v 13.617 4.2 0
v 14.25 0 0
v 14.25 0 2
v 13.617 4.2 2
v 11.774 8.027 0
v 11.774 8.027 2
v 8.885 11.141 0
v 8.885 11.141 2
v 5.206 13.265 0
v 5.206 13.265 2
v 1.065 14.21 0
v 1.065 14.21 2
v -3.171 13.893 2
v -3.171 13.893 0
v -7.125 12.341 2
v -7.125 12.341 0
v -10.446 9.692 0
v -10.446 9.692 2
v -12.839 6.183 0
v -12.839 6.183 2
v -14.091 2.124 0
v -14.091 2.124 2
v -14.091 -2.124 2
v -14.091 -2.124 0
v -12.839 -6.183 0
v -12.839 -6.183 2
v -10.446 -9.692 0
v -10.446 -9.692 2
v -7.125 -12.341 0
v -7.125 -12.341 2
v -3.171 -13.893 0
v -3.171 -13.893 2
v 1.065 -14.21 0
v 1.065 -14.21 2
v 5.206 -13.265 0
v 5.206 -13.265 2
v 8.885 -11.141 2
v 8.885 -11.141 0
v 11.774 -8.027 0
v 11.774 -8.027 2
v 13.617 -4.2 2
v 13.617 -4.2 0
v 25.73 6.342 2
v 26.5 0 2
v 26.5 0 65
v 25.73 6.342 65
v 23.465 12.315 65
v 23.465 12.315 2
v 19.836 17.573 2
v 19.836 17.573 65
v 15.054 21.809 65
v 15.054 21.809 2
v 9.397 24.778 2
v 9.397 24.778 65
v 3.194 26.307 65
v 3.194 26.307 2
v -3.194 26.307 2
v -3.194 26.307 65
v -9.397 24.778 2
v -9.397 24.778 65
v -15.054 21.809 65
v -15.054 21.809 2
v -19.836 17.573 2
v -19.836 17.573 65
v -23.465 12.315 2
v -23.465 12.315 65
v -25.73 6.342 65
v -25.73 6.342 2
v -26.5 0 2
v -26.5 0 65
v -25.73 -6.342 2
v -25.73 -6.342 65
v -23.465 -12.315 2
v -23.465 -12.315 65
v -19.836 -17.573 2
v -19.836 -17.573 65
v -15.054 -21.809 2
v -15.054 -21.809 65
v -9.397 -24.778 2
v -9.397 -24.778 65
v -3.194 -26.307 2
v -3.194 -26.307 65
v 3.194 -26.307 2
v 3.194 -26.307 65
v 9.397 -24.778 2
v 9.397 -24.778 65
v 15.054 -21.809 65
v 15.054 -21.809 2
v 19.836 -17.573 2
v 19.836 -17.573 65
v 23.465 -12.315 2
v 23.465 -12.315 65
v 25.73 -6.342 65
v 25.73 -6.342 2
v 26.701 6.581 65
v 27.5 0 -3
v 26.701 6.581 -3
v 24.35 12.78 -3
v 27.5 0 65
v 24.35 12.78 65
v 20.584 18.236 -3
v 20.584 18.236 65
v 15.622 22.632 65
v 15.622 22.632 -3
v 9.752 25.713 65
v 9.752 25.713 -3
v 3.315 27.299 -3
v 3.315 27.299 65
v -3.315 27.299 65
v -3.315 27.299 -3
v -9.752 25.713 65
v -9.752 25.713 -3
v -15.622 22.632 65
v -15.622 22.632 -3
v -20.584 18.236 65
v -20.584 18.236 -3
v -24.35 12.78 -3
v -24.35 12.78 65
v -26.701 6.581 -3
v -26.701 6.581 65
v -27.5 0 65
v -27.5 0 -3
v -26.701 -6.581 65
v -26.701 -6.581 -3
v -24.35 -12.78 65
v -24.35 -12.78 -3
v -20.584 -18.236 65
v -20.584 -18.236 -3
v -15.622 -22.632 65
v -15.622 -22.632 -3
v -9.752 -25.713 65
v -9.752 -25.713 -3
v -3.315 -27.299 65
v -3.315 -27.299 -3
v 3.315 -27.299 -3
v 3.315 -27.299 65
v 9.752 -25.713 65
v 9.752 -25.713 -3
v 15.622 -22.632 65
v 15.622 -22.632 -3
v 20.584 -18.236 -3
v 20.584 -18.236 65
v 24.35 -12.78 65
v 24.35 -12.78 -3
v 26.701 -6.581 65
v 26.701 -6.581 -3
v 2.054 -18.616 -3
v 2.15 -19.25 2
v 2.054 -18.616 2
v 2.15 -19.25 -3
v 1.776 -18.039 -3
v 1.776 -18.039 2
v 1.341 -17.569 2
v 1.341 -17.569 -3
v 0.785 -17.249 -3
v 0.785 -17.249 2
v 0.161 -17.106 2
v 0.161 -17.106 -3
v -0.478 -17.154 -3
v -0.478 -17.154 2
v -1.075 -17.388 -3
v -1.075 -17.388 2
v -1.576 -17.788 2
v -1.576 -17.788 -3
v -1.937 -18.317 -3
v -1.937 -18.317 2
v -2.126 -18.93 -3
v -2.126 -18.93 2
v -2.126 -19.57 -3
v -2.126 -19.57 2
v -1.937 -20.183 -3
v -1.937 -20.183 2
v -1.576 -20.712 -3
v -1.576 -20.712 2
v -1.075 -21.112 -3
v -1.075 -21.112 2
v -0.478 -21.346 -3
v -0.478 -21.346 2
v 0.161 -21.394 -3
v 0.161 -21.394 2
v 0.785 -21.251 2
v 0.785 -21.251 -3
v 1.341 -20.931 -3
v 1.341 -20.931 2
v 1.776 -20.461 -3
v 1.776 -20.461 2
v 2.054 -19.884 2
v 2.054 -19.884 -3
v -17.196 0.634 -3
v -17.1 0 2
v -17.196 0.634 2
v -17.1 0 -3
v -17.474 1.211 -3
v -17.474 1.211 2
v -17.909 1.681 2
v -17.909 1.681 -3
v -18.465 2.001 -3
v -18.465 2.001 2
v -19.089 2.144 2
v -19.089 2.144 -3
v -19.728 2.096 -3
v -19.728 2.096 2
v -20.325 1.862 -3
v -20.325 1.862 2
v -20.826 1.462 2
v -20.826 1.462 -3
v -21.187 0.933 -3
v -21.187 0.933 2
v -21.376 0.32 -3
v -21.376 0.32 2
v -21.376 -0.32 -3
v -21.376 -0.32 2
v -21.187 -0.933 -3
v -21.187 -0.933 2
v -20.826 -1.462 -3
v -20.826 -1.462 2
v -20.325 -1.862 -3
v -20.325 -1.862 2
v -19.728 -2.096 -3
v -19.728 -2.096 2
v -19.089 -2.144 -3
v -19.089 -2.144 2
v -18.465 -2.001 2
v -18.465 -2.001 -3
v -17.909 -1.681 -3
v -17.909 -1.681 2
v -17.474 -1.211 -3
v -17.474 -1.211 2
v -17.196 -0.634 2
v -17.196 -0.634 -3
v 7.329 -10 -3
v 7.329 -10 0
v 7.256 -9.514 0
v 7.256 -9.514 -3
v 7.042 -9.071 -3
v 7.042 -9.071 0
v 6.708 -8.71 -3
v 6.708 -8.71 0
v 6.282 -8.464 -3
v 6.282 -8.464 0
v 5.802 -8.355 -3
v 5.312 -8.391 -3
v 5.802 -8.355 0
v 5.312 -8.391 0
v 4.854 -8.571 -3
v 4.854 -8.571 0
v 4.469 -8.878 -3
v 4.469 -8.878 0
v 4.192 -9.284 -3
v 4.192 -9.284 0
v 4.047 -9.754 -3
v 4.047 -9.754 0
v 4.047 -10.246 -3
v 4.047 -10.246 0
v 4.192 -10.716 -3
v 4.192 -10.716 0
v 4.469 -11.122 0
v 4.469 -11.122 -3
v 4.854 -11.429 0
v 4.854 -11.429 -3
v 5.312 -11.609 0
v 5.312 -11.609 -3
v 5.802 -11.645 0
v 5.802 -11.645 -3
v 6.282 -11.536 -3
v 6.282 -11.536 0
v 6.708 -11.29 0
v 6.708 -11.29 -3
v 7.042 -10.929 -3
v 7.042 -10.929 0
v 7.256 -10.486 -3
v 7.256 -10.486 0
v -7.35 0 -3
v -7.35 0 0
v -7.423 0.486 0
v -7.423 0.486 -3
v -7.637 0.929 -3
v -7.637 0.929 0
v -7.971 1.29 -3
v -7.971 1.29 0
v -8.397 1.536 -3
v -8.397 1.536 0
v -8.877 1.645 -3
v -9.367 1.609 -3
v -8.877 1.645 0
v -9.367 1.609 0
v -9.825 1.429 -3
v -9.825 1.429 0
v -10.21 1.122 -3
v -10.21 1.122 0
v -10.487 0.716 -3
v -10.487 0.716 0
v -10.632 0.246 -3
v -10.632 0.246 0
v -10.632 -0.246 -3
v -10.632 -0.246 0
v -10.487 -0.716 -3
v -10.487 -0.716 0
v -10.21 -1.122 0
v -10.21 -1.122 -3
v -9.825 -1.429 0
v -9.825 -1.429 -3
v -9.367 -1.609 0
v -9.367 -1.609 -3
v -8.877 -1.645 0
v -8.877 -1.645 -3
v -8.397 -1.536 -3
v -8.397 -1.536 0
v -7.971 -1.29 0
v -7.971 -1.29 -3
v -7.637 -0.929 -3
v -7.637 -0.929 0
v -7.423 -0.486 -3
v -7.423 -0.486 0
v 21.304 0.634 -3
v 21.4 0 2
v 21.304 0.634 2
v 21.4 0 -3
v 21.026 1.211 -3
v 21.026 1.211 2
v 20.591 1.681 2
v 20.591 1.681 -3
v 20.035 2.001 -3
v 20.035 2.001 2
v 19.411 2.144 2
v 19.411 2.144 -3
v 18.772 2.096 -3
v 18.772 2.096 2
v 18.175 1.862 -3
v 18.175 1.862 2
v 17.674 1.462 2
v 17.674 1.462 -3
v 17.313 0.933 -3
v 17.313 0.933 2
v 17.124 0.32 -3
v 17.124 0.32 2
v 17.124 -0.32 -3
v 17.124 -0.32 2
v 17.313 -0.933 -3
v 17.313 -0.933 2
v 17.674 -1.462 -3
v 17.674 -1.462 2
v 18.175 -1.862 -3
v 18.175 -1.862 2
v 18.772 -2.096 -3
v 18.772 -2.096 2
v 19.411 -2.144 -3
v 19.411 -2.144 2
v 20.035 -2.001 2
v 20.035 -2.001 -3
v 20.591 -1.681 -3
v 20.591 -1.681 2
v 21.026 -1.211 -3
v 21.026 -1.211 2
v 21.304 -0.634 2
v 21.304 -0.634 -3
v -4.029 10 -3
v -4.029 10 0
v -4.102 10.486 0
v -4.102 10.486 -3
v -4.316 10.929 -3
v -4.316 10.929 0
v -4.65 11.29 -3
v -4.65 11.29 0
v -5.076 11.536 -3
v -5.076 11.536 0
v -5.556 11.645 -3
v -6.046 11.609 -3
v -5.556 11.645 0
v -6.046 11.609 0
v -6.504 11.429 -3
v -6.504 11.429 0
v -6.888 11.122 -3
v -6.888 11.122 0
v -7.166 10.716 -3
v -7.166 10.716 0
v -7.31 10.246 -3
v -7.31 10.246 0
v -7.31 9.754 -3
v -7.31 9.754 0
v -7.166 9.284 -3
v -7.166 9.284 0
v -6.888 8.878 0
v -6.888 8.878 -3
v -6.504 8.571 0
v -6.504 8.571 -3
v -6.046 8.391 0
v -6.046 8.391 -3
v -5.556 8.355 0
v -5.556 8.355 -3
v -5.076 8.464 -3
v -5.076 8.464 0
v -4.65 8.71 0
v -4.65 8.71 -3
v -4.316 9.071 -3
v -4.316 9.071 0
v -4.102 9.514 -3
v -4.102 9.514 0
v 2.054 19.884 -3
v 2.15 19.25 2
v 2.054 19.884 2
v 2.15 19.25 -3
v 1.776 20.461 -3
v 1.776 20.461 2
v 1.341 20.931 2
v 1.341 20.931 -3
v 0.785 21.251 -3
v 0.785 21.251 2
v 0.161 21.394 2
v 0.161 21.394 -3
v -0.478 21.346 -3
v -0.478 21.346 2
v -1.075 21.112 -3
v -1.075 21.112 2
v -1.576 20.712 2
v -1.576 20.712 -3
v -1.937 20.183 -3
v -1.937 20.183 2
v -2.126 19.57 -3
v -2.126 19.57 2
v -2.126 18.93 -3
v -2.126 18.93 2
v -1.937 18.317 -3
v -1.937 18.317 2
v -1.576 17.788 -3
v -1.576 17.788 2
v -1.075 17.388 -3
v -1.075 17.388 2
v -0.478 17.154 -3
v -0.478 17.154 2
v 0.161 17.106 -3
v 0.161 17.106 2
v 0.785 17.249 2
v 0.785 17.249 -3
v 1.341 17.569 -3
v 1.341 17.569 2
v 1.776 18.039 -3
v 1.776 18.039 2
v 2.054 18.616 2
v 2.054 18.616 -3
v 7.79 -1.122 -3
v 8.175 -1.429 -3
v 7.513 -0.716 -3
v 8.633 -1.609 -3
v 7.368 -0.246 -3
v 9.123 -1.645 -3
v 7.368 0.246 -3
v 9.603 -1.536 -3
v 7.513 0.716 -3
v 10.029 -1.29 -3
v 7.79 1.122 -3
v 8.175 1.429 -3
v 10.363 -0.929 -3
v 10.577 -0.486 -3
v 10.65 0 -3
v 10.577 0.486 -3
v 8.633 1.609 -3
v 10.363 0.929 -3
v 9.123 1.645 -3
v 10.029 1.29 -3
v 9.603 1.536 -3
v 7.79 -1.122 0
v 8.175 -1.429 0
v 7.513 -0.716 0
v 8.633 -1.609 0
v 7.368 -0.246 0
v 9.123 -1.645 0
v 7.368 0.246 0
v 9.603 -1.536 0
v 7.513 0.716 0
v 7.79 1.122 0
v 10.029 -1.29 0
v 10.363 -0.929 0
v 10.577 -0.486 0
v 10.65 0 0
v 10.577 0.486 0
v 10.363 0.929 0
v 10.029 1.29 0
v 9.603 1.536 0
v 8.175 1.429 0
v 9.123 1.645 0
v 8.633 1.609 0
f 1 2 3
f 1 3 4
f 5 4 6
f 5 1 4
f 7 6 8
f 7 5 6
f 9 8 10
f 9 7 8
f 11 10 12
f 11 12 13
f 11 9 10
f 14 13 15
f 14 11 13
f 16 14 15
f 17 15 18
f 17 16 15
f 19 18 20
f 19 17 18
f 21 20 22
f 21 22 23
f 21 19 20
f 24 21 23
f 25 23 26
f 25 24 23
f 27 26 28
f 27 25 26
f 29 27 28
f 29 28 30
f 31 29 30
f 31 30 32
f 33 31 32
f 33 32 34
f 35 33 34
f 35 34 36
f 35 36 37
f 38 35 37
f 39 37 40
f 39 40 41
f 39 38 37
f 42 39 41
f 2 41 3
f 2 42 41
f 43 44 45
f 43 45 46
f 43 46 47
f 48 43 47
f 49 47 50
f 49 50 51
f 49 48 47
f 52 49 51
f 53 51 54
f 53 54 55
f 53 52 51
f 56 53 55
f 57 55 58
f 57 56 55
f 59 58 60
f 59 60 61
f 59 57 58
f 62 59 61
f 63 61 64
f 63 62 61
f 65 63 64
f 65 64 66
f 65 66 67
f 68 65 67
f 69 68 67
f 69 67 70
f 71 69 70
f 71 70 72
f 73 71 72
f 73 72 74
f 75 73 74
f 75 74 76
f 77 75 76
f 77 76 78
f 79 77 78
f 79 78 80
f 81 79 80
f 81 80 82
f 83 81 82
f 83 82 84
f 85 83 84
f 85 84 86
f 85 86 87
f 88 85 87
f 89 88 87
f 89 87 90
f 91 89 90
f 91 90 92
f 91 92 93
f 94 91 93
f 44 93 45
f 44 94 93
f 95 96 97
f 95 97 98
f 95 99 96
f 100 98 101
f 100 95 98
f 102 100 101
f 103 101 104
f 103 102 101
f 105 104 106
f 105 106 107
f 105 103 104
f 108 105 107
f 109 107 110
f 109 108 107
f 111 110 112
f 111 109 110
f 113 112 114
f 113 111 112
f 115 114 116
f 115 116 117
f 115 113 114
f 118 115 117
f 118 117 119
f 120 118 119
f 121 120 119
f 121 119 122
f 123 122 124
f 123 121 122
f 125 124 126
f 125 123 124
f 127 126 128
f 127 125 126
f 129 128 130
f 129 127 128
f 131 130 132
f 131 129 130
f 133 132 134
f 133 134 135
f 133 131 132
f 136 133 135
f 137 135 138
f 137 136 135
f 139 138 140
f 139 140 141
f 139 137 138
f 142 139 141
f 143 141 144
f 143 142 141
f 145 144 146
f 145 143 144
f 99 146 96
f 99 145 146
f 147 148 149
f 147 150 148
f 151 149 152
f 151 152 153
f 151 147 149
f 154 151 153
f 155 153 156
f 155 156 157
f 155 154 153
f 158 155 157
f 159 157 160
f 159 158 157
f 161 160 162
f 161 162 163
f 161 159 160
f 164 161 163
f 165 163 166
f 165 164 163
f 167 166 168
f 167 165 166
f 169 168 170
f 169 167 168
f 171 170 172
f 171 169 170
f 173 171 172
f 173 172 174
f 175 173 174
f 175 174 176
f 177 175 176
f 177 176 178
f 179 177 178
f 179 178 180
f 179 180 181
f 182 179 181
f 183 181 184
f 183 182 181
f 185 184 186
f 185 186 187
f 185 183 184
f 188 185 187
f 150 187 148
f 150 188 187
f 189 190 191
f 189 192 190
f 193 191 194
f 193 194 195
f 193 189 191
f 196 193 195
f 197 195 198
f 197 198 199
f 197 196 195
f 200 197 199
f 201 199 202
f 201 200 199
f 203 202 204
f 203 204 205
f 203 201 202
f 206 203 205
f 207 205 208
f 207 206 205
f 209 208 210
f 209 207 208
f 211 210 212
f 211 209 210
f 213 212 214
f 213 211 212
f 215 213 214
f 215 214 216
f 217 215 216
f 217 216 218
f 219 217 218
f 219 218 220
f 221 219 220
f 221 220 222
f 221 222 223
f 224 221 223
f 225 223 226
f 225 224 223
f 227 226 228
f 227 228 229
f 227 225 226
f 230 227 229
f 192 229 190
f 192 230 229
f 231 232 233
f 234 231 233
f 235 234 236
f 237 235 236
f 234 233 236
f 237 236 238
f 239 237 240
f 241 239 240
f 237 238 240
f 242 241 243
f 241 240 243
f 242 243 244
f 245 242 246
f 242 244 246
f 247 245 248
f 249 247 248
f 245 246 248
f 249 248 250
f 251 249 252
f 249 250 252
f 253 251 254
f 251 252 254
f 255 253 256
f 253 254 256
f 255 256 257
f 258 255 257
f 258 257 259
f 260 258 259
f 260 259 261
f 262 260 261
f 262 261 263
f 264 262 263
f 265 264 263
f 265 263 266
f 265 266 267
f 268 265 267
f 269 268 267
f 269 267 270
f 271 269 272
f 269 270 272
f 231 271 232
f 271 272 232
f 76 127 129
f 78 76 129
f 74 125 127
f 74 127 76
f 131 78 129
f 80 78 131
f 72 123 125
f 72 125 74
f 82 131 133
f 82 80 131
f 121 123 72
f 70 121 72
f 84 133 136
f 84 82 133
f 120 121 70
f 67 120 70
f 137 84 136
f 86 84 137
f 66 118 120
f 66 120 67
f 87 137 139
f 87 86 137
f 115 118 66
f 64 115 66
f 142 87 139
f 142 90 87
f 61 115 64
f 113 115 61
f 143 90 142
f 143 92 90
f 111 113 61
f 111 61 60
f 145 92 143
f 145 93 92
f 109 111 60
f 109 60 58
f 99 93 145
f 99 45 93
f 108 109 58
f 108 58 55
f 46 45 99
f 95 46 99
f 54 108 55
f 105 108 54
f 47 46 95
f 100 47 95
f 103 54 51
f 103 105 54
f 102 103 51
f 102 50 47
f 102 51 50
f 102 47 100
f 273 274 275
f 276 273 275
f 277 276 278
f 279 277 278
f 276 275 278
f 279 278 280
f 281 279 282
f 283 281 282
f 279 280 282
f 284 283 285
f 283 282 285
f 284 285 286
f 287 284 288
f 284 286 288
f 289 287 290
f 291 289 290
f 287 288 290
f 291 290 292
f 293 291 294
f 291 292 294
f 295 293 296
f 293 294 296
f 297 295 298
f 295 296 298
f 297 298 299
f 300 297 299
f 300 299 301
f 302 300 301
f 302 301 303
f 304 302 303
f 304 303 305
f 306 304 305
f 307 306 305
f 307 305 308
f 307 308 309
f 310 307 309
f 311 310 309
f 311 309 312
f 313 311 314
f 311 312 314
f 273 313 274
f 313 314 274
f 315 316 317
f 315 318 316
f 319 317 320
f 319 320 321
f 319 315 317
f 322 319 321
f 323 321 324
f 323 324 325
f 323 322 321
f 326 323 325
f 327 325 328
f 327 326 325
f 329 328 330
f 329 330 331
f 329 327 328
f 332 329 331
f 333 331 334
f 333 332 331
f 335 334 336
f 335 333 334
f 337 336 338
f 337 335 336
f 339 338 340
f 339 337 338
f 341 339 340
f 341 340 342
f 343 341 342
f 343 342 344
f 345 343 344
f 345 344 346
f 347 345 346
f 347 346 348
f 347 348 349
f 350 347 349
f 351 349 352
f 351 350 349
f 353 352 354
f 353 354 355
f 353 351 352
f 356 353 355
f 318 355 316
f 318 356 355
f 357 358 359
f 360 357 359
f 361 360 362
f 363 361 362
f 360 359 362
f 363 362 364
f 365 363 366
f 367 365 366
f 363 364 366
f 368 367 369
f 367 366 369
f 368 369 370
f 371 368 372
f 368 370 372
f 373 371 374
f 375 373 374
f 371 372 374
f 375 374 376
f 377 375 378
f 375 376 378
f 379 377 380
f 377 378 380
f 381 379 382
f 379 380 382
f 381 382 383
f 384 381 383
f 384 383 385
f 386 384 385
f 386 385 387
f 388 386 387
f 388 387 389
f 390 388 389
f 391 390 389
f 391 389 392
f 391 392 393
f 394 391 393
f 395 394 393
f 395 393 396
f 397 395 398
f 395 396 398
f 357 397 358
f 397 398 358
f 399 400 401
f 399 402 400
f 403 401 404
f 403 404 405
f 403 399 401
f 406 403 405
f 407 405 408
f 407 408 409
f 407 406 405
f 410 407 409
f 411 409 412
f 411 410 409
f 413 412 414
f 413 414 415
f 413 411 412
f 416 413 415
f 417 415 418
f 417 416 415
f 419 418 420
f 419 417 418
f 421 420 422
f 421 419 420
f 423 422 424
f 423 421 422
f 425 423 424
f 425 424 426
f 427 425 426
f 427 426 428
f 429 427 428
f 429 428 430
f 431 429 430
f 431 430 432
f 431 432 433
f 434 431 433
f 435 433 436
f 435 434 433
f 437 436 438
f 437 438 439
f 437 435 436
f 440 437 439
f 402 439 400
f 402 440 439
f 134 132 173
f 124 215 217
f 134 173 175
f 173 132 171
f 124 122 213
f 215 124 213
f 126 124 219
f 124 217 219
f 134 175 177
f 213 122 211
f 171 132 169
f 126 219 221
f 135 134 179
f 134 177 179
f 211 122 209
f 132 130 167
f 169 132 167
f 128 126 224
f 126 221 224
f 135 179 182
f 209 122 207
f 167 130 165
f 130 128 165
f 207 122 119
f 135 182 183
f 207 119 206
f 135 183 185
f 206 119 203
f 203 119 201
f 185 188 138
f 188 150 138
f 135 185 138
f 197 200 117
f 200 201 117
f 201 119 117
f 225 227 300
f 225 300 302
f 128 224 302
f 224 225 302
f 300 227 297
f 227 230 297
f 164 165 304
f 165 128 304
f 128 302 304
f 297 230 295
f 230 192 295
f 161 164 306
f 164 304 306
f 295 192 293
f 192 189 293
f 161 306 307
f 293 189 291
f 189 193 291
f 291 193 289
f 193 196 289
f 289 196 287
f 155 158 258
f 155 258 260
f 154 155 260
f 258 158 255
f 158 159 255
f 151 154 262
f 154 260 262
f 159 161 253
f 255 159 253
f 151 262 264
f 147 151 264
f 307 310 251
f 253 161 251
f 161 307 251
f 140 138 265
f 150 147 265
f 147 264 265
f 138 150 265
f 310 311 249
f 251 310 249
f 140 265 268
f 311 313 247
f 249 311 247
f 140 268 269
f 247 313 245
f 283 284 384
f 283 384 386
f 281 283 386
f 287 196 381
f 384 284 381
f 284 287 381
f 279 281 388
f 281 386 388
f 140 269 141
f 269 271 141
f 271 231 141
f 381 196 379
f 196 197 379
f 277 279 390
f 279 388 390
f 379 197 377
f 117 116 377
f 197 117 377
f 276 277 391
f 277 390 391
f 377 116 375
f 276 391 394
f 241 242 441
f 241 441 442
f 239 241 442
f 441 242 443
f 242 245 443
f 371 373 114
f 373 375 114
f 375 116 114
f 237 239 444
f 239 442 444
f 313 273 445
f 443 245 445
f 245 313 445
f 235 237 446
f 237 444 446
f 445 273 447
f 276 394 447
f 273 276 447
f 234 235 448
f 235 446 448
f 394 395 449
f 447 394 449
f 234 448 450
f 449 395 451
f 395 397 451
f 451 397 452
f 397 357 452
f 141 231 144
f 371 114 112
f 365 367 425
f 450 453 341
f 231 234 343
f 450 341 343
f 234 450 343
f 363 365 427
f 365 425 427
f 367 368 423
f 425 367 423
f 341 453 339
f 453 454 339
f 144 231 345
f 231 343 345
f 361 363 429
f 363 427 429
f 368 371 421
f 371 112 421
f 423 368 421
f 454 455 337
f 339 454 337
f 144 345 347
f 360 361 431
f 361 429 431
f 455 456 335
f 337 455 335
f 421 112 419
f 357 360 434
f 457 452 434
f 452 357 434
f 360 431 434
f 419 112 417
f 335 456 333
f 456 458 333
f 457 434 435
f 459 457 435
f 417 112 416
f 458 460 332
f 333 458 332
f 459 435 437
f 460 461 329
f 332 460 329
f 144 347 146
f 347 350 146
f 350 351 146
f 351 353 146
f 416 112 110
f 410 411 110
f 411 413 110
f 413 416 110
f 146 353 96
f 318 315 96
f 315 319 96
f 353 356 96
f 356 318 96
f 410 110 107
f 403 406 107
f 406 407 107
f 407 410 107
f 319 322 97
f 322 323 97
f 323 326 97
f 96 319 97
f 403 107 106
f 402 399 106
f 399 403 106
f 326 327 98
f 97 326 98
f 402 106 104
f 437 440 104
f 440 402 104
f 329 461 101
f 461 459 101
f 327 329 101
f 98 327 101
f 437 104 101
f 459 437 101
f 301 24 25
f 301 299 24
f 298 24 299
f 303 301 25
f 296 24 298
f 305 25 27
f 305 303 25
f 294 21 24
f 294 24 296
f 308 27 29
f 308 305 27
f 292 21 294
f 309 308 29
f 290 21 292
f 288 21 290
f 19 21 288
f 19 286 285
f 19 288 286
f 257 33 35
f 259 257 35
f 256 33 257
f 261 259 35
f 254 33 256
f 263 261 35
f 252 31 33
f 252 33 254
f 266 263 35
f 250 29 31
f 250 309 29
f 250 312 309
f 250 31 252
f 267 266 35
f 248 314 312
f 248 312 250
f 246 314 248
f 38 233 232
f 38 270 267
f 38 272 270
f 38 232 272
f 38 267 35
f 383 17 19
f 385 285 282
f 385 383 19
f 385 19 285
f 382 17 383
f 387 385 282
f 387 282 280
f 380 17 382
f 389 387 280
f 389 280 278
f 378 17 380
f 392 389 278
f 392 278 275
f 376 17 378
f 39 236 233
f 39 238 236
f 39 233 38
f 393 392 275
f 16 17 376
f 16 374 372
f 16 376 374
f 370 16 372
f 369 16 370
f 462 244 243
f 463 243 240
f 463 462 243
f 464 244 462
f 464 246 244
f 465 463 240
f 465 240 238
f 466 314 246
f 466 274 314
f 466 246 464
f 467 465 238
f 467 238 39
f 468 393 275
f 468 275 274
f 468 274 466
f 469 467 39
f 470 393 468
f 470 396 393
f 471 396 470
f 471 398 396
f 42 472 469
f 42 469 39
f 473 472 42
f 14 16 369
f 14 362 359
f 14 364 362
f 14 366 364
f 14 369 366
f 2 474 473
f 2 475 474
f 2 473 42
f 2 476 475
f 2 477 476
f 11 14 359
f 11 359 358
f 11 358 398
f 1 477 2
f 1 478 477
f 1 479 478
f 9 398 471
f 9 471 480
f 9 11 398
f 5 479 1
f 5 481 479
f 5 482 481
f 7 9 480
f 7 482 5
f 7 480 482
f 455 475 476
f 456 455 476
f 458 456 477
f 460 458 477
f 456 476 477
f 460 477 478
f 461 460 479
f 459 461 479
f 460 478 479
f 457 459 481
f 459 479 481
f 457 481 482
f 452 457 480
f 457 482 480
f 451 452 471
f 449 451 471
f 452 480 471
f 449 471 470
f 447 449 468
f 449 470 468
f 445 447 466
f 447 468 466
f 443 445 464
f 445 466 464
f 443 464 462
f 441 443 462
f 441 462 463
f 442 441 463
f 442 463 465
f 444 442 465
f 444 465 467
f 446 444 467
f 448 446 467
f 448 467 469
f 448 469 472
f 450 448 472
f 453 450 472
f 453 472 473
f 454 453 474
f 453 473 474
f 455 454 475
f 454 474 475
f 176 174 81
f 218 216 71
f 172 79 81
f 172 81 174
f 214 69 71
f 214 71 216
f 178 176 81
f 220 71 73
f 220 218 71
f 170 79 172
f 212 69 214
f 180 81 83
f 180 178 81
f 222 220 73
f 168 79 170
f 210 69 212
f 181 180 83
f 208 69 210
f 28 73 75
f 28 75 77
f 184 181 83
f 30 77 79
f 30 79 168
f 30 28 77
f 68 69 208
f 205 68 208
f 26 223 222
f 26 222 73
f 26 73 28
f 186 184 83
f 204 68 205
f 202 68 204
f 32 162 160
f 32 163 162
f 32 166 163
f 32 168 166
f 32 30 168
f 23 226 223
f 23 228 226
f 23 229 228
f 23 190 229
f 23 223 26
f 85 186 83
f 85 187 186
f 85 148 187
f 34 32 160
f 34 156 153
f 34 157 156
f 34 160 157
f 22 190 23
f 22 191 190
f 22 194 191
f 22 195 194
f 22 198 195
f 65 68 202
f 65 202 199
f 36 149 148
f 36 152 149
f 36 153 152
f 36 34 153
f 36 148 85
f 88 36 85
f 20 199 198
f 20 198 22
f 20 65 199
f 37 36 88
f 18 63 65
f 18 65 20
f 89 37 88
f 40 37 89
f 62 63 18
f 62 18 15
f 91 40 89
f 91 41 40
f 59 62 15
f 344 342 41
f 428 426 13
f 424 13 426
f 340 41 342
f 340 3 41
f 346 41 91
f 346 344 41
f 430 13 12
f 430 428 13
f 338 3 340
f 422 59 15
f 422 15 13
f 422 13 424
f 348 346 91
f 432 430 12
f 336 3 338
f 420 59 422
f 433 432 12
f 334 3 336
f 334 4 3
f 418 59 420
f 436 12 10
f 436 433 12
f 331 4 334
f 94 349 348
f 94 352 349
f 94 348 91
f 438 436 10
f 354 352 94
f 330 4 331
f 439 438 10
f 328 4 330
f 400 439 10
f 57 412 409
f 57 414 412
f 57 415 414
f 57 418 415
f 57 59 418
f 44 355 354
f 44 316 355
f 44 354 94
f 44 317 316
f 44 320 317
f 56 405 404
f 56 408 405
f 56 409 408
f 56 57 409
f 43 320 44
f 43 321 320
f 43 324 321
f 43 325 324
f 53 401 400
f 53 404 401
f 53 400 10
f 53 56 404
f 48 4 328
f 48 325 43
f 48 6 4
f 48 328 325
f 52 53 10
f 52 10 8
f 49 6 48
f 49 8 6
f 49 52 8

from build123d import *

# Parameters (mm, degrees)
F0_R     = 27.5
F0_R_2   = 26.5
F1_DEPTH = 65
F0_R_3   = 2.15
F0_R_4   = 14.25
F0_R_5   = 1.65
F2_DEPTH = 3
F3_DEPTH = 2


with BuildPart() as f1:
    # F0 (on Top) → F1 (new body)
    with BuildSketch(Plane.XY):
        Circle(F0_R)
        Circle(F0_R_2, mode=Mode.SUBTRACT)
    extrude(amount=F1_DEPTH)

    # F0 (on Top) → F2 (join)
    with BuildSketch(Plane.XY):
        Circle(F0_R)
        Circle(F0_R_2, mode=Mode.SUBTRACT)
        Circle(F0_R_2)
        with Locations((0, -19.25)):
            Circle(F0_R_3, mode=Mode.SUBTRACT)
        with Locations((-19.25, 0)):
            Circle(F0_R_3, mode=Mode.SUBTRACT)
        Circle(F0_R_4, mode=Mode.SUBTRACT)
        with Locations((19.25, 0)):
            Circle(F0_R_3, mode=Mode.SUBTRACT)
        with Locations((0, 19.25)):
            Circle(F0_R_3, mode=Mode.SUBTRACT)
        Circle(F0_R_4)
        with Locations((5.678908, -10)):
            Circle(F0_R_5, mode=Mode.SUBTRACT)
        with Locations((-9, 0)):
            Circle(F0_R_5, mode=Mode.SUBTRACT)
        with Locations((-5.678908, 10)):
            Circle(F0_R_5, mode=Mode.SUBTRACT)
        with Locations((9, 0)):
            Circle(F0_R_5, mode=Mode.SUBTRACT)
    extrude(amount=-F2_DEPTH)

    # F0 (on Top) → F3 (join)
    with BuildSketch(Plane.XY):
        Circle(F0_R_2)
        with Locations((0, -19.25)):
            Circle(F0_R_3, mode=Mode.SUBTRACT)
        with Locations((-19.25, 0)):
            Circle(F0_R_3, mode=Mode.SUBTRACT)
        Circle(F0_R_4, mode=Mode.SUBTRACT)
        with Locations((19.25, 0)):
            Circle(F0_R_3, mode=Mode.SUBTRACT)
        with Locations((0, 19.25)):
            Circle(F0_R_3, mode=Mode.SUBTRACT)
    extrude(amount=F3_DEPTH)


solid = f1.part
